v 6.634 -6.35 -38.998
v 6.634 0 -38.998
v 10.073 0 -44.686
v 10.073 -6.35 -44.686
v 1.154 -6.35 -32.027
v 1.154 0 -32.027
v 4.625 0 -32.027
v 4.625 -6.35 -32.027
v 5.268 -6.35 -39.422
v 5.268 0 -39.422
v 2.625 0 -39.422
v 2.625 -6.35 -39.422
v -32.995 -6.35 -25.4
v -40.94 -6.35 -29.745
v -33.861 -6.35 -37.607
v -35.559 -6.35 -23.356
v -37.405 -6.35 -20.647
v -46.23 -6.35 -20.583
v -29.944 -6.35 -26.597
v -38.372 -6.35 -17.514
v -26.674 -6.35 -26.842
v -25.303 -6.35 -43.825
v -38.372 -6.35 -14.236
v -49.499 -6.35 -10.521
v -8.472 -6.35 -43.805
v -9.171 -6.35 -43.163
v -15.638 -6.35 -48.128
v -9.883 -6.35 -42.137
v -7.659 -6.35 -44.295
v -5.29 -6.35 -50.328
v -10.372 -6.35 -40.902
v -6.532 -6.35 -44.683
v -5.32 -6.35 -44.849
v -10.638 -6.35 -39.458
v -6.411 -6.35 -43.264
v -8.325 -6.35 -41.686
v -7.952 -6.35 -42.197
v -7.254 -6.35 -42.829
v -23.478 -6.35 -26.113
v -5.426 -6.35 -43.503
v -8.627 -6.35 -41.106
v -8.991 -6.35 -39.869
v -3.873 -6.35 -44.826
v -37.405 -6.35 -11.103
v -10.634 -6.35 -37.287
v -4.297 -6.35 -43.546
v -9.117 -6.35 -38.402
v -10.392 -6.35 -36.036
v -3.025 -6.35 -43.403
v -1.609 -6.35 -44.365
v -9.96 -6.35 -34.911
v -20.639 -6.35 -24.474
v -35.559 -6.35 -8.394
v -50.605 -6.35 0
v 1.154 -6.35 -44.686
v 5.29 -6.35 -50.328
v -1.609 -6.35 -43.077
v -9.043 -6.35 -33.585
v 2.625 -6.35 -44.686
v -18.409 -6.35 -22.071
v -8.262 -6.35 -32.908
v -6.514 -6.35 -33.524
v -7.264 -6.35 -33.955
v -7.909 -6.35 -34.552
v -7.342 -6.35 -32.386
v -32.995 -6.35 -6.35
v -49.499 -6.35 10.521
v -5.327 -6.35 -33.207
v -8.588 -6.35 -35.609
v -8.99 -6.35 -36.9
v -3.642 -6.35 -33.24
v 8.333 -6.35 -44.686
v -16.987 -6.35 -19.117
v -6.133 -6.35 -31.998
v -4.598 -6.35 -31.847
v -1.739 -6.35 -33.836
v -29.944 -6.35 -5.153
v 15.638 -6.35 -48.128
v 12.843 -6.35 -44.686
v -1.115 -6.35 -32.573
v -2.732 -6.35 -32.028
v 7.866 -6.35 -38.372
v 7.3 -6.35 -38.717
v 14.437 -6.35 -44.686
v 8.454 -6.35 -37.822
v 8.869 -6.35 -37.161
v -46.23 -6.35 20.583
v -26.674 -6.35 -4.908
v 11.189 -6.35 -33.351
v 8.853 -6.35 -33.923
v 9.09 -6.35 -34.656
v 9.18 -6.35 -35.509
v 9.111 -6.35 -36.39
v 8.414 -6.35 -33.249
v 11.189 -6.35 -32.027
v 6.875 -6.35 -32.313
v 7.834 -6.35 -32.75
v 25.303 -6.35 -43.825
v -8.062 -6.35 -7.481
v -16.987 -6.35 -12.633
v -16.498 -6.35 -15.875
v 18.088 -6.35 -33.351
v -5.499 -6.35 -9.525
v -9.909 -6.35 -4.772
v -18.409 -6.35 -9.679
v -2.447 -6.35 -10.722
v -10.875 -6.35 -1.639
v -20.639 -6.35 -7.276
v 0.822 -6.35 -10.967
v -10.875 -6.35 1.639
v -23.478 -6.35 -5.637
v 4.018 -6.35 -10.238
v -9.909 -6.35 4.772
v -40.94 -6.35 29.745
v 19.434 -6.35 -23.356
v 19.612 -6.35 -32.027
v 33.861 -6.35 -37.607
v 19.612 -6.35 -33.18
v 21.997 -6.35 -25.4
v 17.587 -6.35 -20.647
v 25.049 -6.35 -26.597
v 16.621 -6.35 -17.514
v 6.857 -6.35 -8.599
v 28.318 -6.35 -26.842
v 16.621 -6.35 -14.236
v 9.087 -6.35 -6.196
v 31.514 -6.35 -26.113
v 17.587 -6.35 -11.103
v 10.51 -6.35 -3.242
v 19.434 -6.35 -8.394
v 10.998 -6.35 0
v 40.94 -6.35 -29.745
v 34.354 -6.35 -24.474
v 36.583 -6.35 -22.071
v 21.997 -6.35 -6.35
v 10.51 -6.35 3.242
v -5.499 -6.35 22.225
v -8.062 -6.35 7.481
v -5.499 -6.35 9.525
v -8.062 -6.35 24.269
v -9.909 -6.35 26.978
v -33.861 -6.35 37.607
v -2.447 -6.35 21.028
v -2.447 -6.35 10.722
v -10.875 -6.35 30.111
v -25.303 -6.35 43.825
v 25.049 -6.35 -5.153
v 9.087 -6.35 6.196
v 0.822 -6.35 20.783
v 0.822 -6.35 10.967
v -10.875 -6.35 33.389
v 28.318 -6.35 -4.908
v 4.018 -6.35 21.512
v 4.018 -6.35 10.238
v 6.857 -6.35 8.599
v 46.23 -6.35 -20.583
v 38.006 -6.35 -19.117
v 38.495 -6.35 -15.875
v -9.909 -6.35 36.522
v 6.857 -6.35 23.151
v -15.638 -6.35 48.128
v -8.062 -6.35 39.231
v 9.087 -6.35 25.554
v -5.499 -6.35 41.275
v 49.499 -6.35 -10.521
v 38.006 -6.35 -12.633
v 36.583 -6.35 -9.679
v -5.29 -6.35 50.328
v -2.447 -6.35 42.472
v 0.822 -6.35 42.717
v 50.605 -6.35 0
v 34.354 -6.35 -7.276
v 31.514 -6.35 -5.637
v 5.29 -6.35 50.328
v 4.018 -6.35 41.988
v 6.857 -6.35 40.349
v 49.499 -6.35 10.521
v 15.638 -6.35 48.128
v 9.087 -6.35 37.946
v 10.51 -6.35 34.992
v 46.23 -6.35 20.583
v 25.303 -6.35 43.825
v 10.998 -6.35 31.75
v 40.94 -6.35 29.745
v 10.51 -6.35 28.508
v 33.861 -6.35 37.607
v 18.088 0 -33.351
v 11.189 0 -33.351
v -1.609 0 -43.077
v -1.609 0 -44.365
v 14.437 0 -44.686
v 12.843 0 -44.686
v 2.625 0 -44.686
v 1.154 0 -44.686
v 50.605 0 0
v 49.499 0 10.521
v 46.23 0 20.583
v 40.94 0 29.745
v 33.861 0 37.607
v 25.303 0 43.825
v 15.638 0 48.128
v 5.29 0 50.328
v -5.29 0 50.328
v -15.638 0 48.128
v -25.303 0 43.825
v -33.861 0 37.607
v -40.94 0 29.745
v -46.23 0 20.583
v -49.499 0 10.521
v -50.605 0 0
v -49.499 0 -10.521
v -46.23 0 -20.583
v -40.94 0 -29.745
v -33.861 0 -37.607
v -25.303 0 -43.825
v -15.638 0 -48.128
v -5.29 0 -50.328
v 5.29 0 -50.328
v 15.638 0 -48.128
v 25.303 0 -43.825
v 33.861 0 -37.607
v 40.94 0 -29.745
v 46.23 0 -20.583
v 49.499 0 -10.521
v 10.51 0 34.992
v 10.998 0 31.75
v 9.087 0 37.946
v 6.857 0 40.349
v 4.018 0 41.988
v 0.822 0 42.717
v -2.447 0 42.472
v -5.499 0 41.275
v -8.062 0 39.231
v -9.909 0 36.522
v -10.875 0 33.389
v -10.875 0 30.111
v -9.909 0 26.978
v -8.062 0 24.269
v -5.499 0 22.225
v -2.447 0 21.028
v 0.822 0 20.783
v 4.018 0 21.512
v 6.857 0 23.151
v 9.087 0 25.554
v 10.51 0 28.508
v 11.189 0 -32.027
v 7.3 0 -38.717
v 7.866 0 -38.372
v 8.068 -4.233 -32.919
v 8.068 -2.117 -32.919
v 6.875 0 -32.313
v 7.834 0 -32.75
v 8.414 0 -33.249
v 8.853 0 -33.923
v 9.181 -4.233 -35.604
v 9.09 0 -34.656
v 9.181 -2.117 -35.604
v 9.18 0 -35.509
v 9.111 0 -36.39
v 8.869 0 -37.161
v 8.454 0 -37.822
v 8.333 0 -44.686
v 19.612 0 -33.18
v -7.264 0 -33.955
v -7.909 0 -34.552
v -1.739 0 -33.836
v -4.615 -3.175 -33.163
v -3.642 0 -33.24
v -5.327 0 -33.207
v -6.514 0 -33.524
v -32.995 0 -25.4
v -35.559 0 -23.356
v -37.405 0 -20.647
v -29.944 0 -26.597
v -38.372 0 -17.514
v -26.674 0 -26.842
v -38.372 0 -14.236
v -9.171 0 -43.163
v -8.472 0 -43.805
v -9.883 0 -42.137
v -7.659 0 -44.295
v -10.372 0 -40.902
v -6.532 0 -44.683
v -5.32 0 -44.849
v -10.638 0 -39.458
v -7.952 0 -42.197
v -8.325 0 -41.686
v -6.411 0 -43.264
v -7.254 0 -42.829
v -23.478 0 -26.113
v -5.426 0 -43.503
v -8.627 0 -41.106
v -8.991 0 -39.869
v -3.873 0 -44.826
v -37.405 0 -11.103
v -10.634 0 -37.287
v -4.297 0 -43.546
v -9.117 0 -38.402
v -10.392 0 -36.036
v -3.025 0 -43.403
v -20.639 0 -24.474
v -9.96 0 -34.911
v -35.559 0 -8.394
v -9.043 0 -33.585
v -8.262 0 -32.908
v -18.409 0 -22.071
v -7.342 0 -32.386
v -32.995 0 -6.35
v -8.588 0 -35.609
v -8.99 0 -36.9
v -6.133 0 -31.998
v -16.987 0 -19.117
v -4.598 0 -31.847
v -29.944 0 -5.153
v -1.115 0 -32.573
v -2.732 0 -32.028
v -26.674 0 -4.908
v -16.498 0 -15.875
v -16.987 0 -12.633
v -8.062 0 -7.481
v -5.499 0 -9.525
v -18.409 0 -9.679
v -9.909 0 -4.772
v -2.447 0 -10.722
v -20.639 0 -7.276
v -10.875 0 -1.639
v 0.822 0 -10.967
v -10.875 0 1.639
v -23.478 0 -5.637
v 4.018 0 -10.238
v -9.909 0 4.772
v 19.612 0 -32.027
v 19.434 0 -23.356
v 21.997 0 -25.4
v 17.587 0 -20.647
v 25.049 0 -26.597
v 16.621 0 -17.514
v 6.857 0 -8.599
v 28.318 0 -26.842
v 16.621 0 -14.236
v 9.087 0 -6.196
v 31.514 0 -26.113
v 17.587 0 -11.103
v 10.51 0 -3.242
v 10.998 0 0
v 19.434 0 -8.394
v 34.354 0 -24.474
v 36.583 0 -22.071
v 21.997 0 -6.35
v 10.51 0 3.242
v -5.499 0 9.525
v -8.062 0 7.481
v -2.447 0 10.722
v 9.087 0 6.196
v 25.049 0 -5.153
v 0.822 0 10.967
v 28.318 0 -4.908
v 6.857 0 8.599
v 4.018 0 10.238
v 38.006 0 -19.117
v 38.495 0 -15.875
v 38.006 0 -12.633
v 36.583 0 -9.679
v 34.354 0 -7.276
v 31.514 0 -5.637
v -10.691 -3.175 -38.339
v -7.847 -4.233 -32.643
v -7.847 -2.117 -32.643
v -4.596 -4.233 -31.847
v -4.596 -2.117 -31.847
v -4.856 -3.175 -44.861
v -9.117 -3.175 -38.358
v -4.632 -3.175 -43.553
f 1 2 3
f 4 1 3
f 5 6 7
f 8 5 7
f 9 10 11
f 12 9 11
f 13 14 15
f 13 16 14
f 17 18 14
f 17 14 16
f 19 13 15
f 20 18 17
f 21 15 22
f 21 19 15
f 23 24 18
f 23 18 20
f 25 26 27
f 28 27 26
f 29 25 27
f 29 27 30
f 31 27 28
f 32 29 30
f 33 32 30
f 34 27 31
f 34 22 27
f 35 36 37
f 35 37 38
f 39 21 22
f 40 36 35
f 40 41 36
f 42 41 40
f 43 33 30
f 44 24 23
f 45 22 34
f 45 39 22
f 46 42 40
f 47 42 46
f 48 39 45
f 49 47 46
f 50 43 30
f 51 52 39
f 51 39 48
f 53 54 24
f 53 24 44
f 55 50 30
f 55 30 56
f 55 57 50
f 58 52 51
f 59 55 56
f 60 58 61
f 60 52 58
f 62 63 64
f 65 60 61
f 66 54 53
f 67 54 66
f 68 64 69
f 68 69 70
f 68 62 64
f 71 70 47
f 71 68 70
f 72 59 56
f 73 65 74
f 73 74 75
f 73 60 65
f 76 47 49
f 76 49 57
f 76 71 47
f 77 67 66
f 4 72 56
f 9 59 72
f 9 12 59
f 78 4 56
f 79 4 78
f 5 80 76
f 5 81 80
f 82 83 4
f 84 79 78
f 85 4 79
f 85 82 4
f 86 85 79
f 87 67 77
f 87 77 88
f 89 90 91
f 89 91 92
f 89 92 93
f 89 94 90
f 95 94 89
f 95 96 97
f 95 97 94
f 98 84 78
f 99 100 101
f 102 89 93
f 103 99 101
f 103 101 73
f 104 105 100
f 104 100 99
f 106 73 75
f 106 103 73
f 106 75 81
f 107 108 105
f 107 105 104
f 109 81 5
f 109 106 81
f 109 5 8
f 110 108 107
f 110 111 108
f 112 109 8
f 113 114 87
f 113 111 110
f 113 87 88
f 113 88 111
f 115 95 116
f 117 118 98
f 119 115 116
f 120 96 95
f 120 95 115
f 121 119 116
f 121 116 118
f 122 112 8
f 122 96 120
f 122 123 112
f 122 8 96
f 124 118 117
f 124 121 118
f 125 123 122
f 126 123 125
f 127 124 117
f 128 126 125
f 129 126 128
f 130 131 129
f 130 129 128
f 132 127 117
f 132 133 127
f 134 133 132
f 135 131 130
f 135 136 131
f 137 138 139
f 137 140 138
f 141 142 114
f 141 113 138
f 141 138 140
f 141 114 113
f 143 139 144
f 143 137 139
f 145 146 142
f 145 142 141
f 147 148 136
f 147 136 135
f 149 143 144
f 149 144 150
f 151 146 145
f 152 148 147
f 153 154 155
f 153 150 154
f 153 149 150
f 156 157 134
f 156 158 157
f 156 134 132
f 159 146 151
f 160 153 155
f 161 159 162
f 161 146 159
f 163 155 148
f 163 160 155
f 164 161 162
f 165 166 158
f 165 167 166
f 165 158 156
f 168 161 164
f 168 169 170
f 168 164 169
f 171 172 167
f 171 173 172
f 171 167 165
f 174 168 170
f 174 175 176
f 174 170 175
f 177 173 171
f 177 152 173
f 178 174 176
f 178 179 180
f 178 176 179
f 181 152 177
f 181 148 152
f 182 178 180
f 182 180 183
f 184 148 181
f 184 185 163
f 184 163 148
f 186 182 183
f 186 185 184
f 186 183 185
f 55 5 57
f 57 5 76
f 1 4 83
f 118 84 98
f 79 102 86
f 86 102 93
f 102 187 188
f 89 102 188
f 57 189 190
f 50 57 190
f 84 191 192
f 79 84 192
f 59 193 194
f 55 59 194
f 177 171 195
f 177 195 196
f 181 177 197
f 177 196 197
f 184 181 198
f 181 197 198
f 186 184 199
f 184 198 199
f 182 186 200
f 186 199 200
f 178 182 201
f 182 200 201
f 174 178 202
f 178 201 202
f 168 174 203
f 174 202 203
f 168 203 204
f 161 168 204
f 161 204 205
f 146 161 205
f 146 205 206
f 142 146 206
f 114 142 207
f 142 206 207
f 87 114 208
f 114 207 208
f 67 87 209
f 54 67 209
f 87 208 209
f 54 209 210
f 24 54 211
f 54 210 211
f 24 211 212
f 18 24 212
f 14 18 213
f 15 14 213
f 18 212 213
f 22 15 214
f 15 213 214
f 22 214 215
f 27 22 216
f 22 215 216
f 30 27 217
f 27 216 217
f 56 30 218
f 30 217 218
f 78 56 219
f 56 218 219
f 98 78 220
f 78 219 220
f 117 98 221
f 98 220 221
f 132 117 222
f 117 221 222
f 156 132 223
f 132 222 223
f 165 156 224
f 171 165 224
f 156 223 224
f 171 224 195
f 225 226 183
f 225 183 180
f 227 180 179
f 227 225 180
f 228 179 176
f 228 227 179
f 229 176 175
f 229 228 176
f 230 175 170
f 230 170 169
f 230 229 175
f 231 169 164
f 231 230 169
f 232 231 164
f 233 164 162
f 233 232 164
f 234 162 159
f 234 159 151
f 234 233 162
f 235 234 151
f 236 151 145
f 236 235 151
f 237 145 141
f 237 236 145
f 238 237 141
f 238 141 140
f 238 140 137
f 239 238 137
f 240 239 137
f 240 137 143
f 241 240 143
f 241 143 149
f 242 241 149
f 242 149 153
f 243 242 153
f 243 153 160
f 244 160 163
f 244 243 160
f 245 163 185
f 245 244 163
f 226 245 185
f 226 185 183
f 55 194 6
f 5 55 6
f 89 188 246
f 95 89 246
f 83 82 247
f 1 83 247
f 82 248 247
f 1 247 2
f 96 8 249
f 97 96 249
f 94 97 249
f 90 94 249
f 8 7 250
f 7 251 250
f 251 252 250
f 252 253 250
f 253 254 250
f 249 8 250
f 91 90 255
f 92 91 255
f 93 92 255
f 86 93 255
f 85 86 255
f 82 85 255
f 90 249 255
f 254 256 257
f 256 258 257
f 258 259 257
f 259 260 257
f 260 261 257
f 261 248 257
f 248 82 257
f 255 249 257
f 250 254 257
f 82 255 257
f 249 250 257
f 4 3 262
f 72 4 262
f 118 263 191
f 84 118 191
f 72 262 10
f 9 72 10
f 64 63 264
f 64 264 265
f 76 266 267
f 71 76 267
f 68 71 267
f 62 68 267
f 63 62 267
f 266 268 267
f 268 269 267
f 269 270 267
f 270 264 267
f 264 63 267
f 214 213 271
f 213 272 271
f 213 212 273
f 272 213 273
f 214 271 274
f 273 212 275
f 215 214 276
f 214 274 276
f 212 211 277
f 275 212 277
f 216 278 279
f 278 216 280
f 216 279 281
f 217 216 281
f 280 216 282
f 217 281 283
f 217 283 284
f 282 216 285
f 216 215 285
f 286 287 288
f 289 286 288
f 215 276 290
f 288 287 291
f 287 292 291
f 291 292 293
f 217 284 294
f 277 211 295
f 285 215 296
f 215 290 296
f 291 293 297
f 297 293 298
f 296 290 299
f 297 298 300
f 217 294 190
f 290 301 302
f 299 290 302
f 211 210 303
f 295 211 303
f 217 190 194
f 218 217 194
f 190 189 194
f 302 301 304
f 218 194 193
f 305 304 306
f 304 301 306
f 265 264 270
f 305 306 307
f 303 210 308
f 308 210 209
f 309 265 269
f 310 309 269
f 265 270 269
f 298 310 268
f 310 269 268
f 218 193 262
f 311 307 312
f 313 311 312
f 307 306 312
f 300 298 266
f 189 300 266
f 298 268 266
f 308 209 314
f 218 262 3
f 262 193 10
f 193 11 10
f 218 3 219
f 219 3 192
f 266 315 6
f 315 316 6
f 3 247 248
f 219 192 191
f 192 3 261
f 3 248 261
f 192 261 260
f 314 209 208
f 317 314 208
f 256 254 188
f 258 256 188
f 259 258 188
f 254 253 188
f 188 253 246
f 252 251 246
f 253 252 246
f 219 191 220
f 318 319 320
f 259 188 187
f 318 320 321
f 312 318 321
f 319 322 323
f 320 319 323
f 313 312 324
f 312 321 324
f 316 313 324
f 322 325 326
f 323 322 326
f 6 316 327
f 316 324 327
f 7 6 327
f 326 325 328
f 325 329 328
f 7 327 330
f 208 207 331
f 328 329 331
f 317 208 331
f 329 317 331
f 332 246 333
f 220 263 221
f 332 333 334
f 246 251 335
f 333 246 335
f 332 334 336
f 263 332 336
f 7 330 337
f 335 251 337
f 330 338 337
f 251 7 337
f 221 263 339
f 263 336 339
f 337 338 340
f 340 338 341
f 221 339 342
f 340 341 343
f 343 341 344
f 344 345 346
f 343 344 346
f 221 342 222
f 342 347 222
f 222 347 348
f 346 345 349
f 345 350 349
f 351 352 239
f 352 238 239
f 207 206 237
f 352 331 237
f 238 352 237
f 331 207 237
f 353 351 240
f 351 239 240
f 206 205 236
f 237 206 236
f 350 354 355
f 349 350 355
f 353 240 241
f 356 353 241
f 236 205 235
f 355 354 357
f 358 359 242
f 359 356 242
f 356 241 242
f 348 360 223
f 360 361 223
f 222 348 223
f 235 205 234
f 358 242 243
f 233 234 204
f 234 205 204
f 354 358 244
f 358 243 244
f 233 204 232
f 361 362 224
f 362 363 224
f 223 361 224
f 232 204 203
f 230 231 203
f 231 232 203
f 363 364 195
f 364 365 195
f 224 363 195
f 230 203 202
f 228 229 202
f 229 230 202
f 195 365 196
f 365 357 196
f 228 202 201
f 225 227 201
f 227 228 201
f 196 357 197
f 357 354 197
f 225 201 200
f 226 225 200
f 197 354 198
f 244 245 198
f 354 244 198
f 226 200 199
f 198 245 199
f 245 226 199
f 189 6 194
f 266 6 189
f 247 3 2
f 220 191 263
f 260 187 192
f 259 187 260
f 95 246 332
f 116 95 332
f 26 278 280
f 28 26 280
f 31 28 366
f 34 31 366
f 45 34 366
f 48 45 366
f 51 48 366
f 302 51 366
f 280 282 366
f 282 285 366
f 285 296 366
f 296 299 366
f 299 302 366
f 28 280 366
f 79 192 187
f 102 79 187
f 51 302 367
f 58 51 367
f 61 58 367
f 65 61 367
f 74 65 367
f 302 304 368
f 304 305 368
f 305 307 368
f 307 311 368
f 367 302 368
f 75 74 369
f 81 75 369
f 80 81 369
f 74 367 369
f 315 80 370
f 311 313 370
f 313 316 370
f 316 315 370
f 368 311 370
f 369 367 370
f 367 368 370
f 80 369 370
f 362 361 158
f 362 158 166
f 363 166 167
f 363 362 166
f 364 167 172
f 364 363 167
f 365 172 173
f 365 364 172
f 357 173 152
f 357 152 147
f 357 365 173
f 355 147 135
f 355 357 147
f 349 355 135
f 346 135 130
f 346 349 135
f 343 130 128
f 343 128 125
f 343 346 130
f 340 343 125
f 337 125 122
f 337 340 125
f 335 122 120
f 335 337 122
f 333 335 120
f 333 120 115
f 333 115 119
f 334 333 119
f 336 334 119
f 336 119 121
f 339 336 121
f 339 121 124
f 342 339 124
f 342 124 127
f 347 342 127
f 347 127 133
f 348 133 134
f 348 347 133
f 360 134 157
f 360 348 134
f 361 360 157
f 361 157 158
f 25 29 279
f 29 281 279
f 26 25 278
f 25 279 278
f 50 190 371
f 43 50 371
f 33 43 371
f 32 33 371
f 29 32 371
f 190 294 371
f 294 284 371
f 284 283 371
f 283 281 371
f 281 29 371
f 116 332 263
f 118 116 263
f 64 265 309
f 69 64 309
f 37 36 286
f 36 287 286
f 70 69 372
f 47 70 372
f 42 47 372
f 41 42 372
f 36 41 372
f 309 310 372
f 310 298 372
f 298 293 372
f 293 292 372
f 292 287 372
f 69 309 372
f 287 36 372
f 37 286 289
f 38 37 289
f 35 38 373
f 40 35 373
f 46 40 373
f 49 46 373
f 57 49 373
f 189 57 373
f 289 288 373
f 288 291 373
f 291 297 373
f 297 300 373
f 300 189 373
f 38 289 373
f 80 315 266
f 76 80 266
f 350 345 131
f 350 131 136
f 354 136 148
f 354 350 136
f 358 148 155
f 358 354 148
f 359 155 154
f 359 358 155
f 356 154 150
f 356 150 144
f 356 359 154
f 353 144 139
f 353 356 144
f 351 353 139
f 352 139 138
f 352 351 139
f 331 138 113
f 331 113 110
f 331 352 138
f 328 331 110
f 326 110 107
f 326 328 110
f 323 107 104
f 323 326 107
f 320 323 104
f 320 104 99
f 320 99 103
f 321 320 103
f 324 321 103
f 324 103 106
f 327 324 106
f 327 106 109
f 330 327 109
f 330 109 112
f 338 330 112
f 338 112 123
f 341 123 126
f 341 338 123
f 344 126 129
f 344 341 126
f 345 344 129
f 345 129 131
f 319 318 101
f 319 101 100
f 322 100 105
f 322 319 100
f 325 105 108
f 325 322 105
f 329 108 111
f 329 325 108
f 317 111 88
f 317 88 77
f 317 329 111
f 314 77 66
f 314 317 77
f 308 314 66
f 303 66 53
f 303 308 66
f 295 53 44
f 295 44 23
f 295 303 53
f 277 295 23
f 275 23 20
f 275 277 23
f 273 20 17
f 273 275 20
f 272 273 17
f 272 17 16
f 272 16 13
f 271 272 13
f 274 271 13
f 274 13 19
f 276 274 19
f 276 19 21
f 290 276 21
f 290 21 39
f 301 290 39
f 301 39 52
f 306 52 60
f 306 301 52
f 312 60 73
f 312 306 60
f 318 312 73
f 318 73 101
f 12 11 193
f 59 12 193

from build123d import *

# Parameters (mm, degrees)
F1_R     = 50.6050754874
F2_DEPTH = 6.35
F0_R     = 10.9982
F3_DEPTH = 6.35


with BuildPart() as f2:
    # F1 (on Front) → F2 (new body)
    with BuildSketch(Plane.XZ):
        Circle(F1_R)
        with BuildLine():
            add(Edge.make_bspline(
                [(-1.7389111535, -33.8362334716), (-3.1769237644, -33.1629443301), (-4.6149363754, -33.1629443301)],
                knots=[0, 0, 0, 1, 1, 1], degree=2))
            add(Edge.make_bspline(
                [(-4.6149363754, -33.1629443301), (-6.7013014931, -33.1629443301), (-7.9093429158, -34.5524690399)],
                knots=[0, 0, 0, 1, 1, 1], degree=2))
            add(Edge.make_bspline(
                [(-7.9093429158, -34.5524690399), (-9.1173843385, -35.9419937498), (-9.1173843385, -38.3580765952)],
                knots=[0, 0, 0, 1, 1, 1], degree=2))
            add(Edge.make_bspline(
                [(-9.1173843385, -38.3580765952), (-9.1173843385, -40.8406571336), (-7.9522893425, -42.196932997)],
                knots=[0, 0, 0, 1, 1, 1], degree=2))
            add(Edge.make_bspline(
                [(-7.9522893425, -42.196932997), (-6.7871943465, -43.5532088603), (-4.6315607987, -43.5532088603)],
                knots=[0, 0, 0, 1, 1, 1], degree=2))
            add(Edge.make_bspline(
                [(-4.6315607987, -43.5532088603), (-3.3071484132, -43.5532088603), (-1.6086865047, -43.0766420605)],
                knots=[0, 0, 0, 1, 1, 1], degree=2))
            Line((-1.6086865047, -43.0766420605), (-1.6086865047, -44.3650348623))
            add(Edge.make_bspline(
                [(-1.6086865047, -44.3650348623), (-2.9247866785, -44.8609968225), (-4.8559905125, -44.8609968225)],
                knots=[0, 0, 0, 1, 1, 1], degree=2))
            add(Edge.make_bspline(
                [(-4.8559905125, -44.8609968225), (-7.6516643555, -44.8609968225), (-9.1714137141, -43.162534914)],
                knots=[0, 0, 0, 1, 1, 1], degree=2))
            add(Edge.make_bspline(
                [(-9.1714137141, -43.162534914), (-10.6911630727, -41.4640730054), (-10.6911630727, -38.3386814348)],
                knots=[0, 0, 0, 1, 1, 1], degree=2))
            add(Edge.make_bspline(
                [(-10.6911630727, -38.3386814348), (-10.6911630727, -36.3825409659), (-9.9596884498, -34.9112795084)],
                knots=[0, 0, 0, 1, 1, 1], degree=2))
            add(Edge.make_bspline(
                [(-9.9596884498, -34.9112795084), (-9.2282138268, -33.4400180509), (-7.8470013286, -32.6434311036)],
                knots=[0, 0, 0, 1, 1, 1], degree=2))
            add(Edge.make_bspline(
                [(-7.8470013286, -32.6434311036), (-6.4657888304, -31.8468441563), (-4.595541215, -31.8468441563)],
                knots=[0, 0, 0, 1, 1, 1], degree=2))
            add(Edge.make_bspline(
                [(-4.595541215, -31.8468441563), (-2.6061518996, -31.8468441563), (-1.1154952816, -32.5727773048)],
                knots=[0, 0, 0, 1, 1, 1], degree=2))
            Line((-1.1154952816, -32.5727773048), (-1.7389111535, -33.8362334716))
        make_face(mode=Mode.SUBTRACT)
        with BuildLine():
            Line((5.2682832457, -39.4220396831), (2.6249999492, -39.4220396831))
            Line((2.6249999492, -39.4220396831), (2.6249999492, -44.6864403784))
            Line((2.6249999492, -44.6864403784), (1.1537384918, -44.6864403784))
            Line((1.1537384918, -44.6864403784), (1.1537384918, -32.0269420748))
            Line((1.1537384918, -32.0269420748), (4.6254722135, -32.0269420748))
            add(Edge.make_bspline(
                [(4.6254722135, -32.0269420748), (6.9556622055, -32.0269420748), (8.0681131945, -32.9191194558)],
                knots=[0, 0, 0, 1, 1, 1], degree=2))
            add(Edge.make_bspline(
                [(8.0681131945, -32.9191194558), (9.1805641835, -33.8112968368), (9.1805641835, -35.6039638104)],
                knots=[0, 0, 0, 1, 1, 1], degree=2))
            add(Edge.make_bspline(
                [(9.1805641835, -35.6039638104), (9.1805641835, -38.1142517209), (6.6342566893, -38.9981168903)],
                knots=[0, 0, 0, 1, 1, 1], degree=2))
            Line((6.6342566893, -38.9981168903), (10.0727415645, -44.6864403784))
            Line((10.0727415645, -44.6864403784), (8.3327185979, -44.6864403784))
            Line((8.3327185979, -44.6864403784), (5.2682832457, -39.4220396831))
        make_face(mode=Mode.SUBTRACT)
        Polygon((14.4366526672, -44.6864403784), (12.8434787726, -44.6864403784), (18.0884843075, -33.3513544602), (11.1893486594, -33.3513544602), (11.1893486594, -32.0269420748), (19.6123897719, -32.0269420748), (19.6123897719, -33.1795687533), align=None, mode=Mode.SUBTRACT)
    extrude(amount=F2_DEPTH)

    # F0 (on Front) → F3 (cut)
    with BuildSketch(Plane.XZ):
        with Locations((0, 31.75)):
            Circle(F0_R)
        Circle(F0_R)
        with Locations((-27.4963065702, -15.875)):
            Circle(F0_R)
        with Locations((27.4963065702, -15.875)):
            Circle(F0_R)
    extrude(amount=F3_DEPTH, mode=Mode.SUBTRACT)


solid = f2.part
